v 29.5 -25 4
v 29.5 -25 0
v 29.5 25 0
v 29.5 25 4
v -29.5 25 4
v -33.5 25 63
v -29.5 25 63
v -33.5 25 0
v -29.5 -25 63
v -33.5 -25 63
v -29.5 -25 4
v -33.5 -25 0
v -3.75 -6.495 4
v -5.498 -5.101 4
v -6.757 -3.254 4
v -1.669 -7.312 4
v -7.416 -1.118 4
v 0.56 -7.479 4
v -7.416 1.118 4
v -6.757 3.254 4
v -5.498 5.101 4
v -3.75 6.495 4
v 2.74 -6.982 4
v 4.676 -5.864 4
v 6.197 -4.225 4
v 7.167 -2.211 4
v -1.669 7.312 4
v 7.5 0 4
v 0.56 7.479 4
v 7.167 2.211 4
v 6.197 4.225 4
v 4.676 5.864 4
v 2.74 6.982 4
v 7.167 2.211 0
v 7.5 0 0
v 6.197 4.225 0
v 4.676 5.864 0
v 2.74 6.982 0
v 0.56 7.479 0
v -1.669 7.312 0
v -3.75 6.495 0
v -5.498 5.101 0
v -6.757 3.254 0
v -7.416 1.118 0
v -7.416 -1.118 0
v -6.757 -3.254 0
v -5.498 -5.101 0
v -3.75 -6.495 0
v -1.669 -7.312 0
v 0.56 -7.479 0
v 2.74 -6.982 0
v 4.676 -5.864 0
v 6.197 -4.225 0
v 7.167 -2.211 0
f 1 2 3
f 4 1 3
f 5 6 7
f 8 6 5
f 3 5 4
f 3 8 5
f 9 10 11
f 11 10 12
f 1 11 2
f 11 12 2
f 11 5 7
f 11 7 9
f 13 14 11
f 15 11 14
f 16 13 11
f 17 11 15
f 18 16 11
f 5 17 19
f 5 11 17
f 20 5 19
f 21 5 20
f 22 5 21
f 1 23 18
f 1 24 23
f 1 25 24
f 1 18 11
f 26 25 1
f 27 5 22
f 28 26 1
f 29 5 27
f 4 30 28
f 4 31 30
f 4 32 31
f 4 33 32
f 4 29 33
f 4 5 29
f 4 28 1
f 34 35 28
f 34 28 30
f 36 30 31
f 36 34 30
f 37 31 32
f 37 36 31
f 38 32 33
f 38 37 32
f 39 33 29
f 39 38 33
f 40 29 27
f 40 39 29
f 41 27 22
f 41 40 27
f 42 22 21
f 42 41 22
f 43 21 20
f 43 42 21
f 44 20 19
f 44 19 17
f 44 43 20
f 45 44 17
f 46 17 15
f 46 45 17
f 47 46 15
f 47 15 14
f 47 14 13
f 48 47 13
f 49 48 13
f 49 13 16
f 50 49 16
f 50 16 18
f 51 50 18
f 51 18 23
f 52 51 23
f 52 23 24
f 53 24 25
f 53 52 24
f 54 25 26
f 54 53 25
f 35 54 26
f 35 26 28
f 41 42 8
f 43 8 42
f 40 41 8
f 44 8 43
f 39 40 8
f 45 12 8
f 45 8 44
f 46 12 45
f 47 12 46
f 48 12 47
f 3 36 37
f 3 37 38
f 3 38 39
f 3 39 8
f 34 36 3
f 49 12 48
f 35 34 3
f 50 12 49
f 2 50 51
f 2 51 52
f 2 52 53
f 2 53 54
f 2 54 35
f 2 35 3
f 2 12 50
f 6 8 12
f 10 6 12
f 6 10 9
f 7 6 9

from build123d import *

# Parameters (mm, degrees)
F0_W     = 59
F0_H     = 50
F0_R     = 7.5
F1_DEPTH = 4
F2_W     = 4
F2_H     = 50
F3_DEPTH = 63


with BuildPart() as f1:
    # F0 (on Top) → F1 (new body)
    with BuildSketch(Plane.XY):
        Rectangle(F0_W, F0_H)
        Circle(F0_R, mode=Mode.SUBTRACT)
    extrude(amount=F1_DEPTH)

    # F2 (on face) → F3 (join)
    with BuildSketch(Plane(origin=(0, 0, 0), x_dir=(1, 0, 0), z_dir=(0, 0, -1))):
        with Locations((-31.5, 0)):
            Rectangle(F2_W, F2_H)
    extrude(amount=-F3_DEPTH)


solid = f1.part
